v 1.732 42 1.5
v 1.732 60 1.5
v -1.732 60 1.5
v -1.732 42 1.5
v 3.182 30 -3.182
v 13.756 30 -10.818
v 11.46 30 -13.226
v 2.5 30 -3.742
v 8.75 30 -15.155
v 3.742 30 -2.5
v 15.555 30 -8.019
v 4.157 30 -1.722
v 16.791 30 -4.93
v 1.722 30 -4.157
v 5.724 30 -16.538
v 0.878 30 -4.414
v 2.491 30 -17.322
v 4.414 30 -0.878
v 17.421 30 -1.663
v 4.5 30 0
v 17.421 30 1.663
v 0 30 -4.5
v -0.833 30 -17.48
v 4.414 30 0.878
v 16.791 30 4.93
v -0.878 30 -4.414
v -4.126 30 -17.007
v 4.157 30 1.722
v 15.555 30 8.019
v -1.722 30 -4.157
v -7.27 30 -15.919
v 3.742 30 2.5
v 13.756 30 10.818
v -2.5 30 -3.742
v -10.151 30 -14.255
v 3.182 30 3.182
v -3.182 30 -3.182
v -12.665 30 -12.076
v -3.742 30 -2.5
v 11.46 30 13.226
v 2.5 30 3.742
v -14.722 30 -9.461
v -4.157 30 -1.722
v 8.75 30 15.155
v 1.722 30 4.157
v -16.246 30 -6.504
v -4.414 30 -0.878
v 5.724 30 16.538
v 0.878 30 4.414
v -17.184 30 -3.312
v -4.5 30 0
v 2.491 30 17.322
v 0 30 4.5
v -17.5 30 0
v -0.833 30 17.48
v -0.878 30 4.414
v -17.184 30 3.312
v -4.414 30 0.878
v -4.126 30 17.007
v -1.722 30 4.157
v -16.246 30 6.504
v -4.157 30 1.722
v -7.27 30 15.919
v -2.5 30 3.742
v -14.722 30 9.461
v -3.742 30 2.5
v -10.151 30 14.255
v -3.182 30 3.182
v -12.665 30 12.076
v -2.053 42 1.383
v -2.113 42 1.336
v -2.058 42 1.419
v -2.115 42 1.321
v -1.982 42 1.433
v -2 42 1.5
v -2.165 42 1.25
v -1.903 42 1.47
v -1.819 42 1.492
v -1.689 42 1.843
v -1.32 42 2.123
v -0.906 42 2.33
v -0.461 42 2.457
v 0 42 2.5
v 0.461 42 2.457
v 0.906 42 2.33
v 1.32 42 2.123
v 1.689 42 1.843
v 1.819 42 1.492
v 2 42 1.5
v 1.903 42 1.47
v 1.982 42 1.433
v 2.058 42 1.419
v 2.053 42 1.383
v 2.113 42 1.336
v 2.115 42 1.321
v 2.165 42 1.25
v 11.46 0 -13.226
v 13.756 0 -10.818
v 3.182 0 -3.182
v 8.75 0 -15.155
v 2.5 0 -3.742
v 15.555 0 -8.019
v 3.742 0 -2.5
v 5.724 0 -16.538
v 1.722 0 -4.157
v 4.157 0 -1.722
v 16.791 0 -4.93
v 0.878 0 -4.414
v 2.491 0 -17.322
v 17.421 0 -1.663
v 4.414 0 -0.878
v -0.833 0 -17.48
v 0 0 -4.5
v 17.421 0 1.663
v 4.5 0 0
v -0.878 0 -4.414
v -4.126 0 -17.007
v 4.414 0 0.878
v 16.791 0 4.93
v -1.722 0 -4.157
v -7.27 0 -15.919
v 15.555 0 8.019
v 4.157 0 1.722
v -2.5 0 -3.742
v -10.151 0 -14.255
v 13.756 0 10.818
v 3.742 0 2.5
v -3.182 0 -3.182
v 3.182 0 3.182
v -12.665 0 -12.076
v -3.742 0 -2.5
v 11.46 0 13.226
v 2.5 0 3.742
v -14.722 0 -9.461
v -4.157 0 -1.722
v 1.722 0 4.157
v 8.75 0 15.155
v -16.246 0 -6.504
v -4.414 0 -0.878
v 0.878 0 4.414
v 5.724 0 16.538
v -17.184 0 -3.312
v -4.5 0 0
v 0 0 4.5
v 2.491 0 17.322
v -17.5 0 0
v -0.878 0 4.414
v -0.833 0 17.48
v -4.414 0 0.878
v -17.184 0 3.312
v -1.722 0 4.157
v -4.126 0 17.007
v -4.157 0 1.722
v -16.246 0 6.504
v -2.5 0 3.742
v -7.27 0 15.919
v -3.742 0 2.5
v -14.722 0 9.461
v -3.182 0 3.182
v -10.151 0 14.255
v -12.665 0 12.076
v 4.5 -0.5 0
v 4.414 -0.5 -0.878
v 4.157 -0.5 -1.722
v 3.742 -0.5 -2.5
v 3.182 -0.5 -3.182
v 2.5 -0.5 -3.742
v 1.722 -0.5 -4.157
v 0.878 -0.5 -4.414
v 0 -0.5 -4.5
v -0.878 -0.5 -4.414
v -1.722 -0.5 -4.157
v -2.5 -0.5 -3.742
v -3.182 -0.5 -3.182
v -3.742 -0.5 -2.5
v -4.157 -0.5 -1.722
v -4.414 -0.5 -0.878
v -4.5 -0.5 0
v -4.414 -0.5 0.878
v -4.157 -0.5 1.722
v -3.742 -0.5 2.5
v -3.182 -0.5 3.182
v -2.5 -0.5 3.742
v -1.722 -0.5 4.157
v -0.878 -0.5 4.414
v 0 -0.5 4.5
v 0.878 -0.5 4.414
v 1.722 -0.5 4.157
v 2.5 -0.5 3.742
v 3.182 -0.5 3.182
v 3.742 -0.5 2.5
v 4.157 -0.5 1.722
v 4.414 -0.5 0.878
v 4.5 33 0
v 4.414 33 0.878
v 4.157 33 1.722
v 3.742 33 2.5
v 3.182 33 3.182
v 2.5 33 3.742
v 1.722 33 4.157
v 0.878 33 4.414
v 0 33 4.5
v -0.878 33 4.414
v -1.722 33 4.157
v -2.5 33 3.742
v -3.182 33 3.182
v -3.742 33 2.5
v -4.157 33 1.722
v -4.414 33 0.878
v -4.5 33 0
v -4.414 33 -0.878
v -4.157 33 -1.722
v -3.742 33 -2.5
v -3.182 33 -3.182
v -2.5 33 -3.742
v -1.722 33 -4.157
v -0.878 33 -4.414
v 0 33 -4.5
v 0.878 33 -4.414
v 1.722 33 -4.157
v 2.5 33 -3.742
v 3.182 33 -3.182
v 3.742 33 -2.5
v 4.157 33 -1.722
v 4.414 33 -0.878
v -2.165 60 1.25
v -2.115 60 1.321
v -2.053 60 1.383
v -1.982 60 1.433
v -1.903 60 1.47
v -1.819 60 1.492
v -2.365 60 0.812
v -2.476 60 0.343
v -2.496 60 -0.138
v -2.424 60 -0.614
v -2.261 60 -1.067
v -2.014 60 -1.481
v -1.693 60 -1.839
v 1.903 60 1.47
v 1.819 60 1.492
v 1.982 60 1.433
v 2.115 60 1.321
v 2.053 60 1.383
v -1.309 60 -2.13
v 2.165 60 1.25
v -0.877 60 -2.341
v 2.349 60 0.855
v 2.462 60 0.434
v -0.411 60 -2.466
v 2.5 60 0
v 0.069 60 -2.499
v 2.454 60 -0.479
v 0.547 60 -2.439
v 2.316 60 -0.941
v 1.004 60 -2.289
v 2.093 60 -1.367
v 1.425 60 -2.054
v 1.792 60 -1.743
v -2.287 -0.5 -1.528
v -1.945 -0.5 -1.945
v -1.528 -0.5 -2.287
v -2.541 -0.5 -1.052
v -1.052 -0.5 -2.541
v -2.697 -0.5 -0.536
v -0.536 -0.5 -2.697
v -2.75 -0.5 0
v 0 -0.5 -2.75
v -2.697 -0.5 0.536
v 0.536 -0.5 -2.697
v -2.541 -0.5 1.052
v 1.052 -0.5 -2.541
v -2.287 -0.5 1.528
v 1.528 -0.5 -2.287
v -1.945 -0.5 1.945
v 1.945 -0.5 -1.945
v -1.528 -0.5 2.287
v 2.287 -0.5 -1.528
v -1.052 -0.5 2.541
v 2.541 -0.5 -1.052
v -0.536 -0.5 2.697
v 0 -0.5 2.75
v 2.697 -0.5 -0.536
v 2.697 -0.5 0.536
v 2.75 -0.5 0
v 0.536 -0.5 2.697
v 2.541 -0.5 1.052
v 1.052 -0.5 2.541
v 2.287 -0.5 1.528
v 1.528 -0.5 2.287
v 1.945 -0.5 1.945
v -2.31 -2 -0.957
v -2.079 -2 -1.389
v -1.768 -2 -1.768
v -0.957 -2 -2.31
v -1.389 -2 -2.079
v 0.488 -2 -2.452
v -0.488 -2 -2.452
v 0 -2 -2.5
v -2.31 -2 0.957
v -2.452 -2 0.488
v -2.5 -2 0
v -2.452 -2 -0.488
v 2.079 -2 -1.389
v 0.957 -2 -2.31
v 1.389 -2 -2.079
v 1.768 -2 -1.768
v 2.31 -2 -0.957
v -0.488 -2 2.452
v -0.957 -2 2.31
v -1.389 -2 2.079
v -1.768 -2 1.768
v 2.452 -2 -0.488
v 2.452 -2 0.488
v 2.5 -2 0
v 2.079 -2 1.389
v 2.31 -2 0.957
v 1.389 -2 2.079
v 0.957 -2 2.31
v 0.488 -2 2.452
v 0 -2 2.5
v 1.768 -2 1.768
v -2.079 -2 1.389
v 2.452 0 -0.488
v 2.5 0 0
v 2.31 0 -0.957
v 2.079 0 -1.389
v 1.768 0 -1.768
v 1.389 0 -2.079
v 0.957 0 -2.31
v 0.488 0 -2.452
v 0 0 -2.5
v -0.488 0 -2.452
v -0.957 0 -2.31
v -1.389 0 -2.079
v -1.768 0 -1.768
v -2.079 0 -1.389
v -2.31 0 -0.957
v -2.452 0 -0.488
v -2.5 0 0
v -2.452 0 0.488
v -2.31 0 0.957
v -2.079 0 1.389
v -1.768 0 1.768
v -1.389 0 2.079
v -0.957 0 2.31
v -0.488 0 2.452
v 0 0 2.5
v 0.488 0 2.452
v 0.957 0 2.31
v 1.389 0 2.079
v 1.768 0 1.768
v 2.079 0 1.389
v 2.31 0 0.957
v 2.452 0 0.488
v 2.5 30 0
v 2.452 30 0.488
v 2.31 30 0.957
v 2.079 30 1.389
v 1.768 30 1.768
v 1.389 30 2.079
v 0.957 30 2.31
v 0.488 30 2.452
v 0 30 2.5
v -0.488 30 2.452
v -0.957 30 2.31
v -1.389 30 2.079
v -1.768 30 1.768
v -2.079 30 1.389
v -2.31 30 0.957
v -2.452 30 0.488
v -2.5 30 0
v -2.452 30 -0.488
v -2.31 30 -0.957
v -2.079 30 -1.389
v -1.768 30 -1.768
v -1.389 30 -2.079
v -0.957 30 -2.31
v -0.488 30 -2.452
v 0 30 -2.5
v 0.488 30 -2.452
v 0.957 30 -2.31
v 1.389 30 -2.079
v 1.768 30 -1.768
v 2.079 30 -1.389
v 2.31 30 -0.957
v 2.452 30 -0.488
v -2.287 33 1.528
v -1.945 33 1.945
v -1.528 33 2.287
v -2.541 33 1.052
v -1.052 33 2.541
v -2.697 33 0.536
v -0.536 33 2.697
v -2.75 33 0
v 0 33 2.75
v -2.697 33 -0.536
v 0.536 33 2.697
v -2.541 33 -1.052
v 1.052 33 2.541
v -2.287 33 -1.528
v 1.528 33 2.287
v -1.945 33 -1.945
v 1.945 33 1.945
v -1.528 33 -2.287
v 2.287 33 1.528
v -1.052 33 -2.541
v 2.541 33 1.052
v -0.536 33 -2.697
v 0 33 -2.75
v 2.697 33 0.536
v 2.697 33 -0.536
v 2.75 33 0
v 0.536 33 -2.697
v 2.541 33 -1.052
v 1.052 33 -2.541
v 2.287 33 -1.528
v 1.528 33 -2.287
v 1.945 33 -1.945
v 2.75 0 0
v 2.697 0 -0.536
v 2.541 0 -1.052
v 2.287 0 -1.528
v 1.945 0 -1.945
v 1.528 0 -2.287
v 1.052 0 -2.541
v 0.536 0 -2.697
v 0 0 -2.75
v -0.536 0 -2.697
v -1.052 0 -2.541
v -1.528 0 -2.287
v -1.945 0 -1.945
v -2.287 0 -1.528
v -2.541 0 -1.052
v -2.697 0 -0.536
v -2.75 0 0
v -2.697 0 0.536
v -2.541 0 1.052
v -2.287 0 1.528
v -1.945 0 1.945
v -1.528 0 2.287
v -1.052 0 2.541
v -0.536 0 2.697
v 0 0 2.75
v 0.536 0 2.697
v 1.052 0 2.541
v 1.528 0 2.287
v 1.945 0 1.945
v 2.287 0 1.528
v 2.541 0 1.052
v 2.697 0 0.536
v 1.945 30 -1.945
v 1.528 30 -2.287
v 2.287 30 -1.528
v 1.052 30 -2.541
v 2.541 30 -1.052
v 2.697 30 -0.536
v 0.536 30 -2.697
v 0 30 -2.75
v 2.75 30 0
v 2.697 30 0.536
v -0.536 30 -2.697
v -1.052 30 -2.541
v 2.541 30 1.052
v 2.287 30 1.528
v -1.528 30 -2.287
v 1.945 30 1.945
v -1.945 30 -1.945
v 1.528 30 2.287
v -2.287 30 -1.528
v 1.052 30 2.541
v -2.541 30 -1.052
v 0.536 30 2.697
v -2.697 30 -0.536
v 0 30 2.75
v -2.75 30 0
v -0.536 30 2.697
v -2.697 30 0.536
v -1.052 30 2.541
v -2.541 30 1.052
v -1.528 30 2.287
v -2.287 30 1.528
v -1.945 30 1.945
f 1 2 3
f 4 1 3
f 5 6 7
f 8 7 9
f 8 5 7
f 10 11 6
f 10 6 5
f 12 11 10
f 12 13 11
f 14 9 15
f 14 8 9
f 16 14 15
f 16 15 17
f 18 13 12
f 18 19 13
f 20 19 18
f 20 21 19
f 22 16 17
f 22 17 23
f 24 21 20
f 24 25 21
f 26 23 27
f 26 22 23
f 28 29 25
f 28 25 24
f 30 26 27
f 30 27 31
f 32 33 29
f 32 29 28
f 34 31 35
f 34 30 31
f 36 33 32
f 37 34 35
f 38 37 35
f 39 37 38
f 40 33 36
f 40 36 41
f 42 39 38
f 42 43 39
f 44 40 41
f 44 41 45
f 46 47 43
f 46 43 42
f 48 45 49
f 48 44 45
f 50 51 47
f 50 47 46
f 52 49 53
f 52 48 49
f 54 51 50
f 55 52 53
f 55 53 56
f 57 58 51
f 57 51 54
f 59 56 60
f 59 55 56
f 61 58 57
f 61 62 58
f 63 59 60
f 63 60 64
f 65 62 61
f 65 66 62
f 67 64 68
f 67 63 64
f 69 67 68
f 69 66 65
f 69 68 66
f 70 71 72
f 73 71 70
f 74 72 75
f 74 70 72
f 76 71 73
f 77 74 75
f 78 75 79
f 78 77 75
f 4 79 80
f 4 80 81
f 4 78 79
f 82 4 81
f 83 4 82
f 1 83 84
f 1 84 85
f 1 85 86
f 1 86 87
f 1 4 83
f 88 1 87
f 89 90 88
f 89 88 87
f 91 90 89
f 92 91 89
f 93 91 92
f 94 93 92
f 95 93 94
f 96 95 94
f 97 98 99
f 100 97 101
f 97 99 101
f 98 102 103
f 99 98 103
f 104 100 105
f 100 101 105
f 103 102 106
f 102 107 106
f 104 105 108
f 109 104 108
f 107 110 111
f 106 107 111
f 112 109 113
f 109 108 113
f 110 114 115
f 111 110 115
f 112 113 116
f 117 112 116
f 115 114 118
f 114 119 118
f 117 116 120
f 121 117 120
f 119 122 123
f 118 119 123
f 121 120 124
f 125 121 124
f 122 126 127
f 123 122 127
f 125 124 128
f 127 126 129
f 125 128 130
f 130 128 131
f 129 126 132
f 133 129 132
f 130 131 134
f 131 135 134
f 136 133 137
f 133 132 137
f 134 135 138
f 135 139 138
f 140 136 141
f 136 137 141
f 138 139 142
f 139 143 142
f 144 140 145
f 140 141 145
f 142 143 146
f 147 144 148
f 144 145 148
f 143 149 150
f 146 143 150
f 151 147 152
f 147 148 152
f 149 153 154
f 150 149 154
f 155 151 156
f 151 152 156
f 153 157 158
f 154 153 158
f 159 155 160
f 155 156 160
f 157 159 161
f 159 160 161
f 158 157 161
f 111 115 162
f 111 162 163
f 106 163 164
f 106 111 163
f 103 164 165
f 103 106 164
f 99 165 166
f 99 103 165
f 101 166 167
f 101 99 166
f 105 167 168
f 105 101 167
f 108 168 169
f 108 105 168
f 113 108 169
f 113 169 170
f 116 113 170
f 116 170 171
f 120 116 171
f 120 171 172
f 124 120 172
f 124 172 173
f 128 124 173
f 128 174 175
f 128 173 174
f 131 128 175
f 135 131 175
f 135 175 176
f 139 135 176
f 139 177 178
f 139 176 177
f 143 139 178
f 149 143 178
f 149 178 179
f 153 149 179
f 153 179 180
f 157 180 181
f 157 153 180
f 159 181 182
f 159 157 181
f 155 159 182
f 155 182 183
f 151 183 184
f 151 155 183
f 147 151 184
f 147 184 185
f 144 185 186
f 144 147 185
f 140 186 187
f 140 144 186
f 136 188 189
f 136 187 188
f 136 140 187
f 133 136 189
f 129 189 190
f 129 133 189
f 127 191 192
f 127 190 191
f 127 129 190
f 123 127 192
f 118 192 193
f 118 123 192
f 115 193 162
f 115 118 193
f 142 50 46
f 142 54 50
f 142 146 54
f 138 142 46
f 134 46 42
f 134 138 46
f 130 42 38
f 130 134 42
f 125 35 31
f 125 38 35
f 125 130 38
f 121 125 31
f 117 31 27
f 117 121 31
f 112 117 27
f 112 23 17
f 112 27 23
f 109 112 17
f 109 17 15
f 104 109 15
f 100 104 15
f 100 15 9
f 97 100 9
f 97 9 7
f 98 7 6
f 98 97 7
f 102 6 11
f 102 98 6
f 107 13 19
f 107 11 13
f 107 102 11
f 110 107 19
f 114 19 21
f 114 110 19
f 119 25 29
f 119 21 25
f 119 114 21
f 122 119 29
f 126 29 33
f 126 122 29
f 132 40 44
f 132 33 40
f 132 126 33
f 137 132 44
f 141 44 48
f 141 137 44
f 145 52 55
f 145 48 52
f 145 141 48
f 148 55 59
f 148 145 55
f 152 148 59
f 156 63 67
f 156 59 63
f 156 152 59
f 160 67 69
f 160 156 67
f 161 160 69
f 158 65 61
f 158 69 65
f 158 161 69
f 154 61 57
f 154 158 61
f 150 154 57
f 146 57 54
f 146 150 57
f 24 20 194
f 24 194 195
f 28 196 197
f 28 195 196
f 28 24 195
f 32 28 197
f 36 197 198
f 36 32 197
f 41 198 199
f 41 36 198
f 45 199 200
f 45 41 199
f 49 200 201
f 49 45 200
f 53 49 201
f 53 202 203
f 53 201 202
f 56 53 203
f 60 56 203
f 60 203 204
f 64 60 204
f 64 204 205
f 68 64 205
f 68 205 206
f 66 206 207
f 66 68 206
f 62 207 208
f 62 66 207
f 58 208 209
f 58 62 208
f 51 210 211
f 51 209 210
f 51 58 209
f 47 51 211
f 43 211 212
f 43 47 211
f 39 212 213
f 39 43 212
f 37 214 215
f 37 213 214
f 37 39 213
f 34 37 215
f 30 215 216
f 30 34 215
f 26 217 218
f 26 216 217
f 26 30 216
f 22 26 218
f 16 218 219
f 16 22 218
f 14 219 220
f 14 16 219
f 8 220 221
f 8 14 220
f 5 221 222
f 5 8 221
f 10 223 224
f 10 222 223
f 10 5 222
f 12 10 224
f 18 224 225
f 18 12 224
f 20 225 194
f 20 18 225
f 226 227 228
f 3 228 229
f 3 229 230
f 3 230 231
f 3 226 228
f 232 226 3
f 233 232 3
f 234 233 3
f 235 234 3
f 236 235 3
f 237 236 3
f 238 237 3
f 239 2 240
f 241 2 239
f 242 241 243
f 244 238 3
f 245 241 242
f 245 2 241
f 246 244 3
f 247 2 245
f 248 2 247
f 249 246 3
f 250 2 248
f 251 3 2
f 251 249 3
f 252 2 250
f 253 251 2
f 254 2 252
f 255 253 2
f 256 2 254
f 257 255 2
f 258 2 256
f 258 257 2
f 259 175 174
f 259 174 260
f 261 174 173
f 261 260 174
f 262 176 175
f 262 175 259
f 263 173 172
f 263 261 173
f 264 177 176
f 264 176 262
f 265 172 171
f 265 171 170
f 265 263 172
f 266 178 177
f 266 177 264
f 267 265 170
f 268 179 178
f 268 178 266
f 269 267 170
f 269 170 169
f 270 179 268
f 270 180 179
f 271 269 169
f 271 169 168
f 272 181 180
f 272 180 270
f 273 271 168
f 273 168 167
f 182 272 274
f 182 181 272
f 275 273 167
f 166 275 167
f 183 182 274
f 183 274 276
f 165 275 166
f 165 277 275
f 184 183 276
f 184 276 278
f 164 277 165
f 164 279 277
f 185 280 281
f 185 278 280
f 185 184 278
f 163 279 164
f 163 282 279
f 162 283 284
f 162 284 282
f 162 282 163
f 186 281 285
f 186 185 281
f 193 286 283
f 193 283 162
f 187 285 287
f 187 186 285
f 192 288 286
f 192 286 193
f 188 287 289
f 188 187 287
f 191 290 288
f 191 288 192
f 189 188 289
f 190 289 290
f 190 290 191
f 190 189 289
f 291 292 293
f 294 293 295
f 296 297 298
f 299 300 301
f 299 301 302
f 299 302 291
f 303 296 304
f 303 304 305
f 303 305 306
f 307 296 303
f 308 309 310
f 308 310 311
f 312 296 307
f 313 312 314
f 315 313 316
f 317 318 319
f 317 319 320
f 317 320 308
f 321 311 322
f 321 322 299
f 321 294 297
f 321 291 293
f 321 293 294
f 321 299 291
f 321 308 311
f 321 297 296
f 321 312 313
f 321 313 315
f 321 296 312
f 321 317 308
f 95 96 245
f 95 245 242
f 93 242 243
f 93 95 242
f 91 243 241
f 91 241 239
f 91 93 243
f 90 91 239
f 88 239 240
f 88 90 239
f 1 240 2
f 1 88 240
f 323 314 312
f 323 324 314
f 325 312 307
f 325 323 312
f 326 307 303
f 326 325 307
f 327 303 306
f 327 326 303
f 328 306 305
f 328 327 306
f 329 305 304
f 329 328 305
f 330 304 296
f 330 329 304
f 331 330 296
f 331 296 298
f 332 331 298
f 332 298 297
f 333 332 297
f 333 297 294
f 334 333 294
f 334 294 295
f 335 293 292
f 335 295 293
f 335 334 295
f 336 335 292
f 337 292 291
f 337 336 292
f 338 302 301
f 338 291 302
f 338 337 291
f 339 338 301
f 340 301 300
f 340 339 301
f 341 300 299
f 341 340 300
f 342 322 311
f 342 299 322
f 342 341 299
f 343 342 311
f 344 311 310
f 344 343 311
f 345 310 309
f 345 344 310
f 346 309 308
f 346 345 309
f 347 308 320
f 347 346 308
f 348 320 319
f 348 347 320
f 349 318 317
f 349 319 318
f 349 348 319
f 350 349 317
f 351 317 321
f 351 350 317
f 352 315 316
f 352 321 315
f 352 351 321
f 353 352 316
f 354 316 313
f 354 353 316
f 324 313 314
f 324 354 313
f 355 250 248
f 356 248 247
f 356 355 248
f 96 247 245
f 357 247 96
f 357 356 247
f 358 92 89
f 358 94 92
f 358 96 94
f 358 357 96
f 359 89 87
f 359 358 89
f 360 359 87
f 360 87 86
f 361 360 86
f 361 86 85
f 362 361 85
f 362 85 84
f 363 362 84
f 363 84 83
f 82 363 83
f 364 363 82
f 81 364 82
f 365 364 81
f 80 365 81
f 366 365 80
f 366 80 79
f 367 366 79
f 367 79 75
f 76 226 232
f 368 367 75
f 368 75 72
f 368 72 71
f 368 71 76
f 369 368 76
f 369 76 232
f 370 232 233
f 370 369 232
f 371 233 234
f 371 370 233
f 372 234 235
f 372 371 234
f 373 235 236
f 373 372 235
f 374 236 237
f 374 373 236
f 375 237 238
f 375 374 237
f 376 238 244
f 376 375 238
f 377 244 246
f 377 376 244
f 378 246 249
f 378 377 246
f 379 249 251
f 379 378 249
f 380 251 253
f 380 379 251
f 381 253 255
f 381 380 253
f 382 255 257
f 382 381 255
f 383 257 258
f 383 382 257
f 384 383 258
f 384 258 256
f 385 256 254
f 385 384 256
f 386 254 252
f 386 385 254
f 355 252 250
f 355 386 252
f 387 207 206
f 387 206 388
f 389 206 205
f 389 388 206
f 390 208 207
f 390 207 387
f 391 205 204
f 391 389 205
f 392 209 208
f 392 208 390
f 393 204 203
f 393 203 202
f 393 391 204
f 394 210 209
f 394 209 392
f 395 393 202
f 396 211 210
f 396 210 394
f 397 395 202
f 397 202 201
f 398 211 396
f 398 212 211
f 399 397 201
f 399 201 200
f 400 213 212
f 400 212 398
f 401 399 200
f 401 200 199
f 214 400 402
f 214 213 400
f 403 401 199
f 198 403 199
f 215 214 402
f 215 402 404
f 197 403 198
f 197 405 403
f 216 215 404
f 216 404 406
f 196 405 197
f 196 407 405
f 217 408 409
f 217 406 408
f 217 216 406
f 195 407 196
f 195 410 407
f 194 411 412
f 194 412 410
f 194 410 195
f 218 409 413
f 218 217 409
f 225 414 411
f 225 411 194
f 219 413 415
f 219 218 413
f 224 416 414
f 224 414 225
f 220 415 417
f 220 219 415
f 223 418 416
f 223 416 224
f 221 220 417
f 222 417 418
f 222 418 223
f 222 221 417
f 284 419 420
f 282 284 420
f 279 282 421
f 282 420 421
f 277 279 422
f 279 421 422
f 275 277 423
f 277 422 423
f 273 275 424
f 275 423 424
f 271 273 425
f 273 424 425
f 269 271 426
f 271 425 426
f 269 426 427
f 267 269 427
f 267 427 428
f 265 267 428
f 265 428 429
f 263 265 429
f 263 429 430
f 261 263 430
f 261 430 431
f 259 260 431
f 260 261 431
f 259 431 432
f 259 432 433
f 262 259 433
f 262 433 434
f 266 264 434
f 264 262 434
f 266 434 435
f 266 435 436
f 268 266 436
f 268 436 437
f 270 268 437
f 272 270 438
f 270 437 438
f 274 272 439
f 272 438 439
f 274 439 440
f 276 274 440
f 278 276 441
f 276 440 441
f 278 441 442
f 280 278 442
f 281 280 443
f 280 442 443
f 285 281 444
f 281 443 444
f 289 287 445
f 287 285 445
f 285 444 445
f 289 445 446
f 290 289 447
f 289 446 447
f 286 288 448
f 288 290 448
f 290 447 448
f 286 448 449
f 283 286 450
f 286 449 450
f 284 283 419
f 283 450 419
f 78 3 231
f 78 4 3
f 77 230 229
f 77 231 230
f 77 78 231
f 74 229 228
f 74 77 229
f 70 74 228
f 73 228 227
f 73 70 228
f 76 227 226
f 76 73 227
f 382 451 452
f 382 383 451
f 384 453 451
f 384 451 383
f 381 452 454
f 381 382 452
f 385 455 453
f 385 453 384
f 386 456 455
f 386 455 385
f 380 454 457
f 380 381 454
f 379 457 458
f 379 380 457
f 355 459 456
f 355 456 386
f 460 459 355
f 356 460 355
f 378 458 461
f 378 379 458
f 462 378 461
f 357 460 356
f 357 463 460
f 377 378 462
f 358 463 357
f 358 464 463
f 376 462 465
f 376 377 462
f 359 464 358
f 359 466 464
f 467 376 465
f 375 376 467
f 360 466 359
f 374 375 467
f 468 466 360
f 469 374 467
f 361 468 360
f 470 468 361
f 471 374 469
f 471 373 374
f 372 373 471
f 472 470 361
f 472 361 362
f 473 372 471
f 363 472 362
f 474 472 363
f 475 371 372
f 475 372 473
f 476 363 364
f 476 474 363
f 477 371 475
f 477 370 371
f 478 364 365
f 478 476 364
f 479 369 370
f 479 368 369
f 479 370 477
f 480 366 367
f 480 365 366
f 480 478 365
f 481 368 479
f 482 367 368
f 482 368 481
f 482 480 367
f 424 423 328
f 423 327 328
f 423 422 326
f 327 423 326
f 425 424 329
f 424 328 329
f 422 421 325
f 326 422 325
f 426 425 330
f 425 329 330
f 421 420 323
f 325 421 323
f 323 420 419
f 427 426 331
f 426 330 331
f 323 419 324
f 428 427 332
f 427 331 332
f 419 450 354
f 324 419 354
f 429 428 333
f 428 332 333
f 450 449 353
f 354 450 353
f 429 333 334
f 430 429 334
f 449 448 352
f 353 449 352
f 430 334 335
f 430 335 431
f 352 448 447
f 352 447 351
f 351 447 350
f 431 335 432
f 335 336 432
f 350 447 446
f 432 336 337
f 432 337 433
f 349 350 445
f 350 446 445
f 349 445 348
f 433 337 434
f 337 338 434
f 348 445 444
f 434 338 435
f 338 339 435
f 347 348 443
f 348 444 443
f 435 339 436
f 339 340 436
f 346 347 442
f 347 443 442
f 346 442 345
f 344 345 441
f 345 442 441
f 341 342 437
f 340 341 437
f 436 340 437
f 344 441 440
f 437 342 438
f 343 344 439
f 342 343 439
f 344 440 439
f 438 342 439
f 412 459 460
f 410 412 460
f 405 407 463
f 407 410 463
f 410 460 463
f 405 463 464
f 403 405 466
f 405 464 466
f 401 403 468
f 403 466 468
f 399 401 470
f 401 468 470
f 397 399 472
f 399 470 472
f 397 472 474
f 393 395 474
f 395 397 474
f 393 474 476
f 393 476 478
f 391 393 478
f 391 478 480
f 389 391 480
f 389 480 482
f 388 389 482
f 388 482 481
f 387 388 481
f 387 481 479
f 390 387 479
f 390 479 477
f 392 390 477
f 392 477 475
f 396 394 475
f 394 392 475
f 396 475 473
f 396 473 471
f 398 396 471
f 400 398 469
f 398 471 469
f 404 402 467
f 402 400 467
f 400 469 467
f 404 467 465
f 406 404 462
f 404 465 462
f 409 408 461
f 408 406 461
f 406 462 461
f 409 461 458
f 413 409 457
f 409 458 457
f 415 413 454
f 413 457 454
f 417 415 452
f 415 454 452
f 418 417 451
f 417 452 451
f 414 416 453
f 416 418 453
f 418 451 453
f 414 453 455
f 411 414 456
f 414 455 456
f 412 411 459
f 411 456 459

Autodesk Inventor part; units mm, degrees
ref_plane "YZ Plane" through (0, 0, 0) normal (1, 0, 0) x (0, 1, 0)
ref_plane "XZ Plane" through (0, 0, 0) normal (0, 1, 0) x (-1, 0, 0)
ref_plane "XY Plane" through (0, 0, 0) normal (0, 0, 1) x (1, 0, 0)
sketch "Sketch1" plane through (0, 0, 0) normal (0, 1, 0) x (-1, 0, 0)
  circle A0 centre (0, 0) radius 17.5
  dimension "d0" = 35
extrude "Extrusion1" add sketch "Sketch1" along normal blind 30
sketch "Sketch2" plane through (0, 0, 0) normal (0, -1, 0) x (1, 0, 0)
  circle A0 centre (0, 0) radius 2.5
  dimension "d3" = 5
extrude "Extrusion2" add sketch "Sketch2" along normal blind 2
sketch "Sketch3" plane through (0, 30, 0) normal (0, 1, 0) x (1, 0, 0)
  circle A0 centre (0, 0) radius 2.5
  dimension "d6" = 5
extrude "Extrusion3" add sketch "Sketch3" along normal blind 30
sketch "Sketch4" plane through (0, 30, 0) normal (0, 1, 0) x (1, 0, 0)
  circle A0 centre (0, 0) radius 4.5
  circle A1 centre (0, 0) radius 2.75
  dimension "d9" = 9
  dimension "d12" = 5.5
extrude "Extrusion5" add sketch "Sketch4" along normal blind 3
sketch "Sketch5" plane through (0, 0, 0) normal (0, -1, 0) x (1, 0, 0)
  circle A0 centre (0, 0) radius 2.75
  circle A1 centre (0, 0) radius 4.5
  dimension "d15" = 5.5
  dimension "d16" = 9
extrude "Extrusion6" add sketch "Sketch5" along normal blind 0.5
sketch "Sketch6" plane through (0, 60, 0) normal (0, 1, 0) x (1, 0, 0)
  line L0 (2.243, -1.5) -> (-2.3112, -1.5)
  circle A0 centre (0, 0) radius 2.75 projected
  circle A1 centre (0, 0) radius 2.5 projected
  circle A2 centre (0, 0) radius 2.5 projected
  line L1 (2, -1.5) -> (-2, -1.5)
  dimension "d19" = 1.5
extrude "Extrusion7" cut sketch "Sketch6" against normal blind 18 contours A1 L0 picked at (-0.534, -1.6398)
fillet "Fillet1" radius 0.5 2 edges at (2, 51, 1.5) (-2, 51, 1.5)
